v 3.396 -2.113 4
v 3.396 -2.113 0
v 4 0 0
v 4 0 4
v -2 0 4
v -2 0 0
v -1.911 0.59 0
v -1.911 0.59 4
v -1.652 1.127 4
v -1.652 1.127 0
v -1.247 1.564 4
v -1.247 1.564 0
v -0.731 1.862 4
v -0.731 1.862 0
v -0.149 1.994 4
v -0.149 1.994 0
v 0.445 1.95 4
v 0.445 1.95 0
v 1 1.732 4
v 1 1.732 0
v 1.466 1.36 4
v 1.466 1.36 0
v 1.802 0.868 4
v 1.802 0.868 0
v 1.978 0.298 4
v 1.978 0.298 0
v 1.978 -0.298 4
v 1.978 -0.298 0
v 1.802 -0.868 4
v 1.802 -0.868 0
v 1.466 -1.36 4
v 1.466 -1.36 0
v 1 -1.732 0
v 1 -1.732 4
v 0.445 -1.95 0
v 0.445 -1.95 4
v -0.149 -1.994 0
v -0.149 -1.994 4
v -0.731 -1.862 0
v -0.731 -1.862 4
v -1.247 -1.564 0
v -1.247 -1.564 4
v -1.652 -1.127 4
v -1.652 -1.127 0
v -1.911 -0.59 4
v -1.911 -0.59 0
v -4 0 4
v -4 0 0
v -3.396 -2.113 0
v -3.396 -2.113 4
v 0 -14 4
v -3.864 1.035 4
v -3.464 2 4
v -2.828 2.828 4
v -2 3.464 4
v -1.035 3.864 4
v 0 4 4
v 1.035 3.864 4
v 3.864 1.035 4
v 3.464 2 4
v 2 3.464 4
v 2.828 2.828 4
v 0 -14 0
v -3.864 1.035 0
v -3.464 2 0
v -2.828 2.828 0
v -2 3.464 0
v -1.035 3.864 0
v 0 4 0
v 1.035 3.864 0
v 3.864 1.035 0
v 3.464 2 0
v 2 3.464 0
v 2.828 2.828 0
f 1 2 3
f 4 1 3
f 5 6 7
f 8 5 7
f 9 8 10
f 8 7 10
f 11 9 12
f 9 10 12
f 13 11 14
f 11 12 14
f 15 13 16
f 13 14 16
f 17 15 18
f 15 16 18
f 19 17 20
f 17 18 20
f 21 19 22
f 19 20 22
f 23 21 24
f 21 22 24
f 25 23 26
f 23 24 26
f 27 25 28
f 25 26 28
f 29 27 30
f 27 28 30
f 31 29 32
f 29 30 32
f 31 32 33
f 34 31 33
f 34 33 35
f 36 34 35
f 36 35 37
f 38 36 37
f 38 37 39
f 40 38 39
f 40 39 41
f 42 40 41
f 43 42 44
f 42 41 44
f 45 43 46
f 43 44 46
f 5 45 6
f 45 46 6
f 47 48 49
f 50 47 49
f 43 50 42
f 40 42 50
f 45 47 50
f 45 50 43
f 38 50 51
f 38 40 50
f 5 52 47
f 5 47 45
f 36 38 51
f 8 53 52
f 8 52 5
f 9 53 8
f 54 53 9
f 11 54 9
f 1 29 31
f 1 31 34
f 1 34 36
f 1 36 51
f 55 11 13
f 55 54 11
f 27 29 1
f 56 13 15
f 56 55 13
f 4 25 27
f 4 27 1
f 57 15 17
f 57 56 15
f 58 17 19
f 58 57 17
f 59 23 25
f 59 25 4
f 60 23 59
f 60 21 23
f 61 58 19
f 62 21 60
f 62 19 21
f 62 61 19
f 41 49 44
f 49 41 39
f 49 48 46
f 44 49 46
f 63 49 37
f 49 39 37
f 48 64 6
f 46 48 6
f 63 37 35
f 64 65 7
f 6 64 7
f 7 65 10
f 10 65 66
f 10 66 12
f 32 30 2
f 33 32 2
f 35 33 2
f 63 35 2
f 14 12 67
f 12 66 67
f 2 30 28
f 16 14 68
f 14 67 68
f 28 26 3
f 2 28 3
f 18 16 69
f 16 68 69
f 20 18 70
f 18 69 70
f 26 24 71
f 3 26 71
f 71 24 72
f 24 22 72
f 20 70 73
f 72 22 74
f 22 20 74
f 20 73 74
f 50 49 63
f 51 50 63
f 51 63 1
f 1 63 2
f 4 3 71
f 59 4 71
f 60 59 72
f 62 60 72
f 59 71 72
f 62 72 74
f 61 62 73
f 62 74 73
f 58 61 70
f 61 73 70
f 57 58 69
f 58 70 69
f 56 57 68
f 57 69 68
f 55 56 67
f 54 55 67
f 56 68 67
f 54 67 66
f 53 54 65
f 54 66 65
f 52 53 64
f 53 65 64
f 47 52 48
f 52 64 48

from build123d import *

# Parameters (mm, degrees)
BOSS_EXTRUDE1_DEPTH = 4


with BuildPart() as part:
    # Sketch1 → Boss-Extrude1 (new body)
    with BuildSketch(Plane.XY):
        with BuildLine():
            ThreePointArc((3.396226415, -2.113207547), (0, -4), (-3.396226415, -2.113207547))
            Line((-3.396226415, -2.113207547), (0, -14))
            Line((0, -14), (3.396226415, -2.113207547))
        make_face()
        with BuildLine():
            Line((-2, 0), (-4, 0))
            Line((-4, 0), (-3.396226415, -2.113207547))
            ThreePointArc((-3.396226415, -2.113207547), (0, -4), (3.396226415, -2.113207547))
            Line((3.396226415, -2.113207547), (4, 0))
            Line((4, 0), (2, 0))
            ThreePointArc((2, 0), (0, -2), (-2, 0))
        make_face()
        with BuildLine():
            ThreePointArc((4, 0), (0, 4), (-4, 0))
            Line((-4, 0), (-2, 0))
            ThreePointArc((-2, 0), (0, 2), (2, 0))
            Line((2, 0), (4, 0))
        make_face()
    extrude(amount=BOSS_EXTRUDE1_DEPTH)


solid = part.part
